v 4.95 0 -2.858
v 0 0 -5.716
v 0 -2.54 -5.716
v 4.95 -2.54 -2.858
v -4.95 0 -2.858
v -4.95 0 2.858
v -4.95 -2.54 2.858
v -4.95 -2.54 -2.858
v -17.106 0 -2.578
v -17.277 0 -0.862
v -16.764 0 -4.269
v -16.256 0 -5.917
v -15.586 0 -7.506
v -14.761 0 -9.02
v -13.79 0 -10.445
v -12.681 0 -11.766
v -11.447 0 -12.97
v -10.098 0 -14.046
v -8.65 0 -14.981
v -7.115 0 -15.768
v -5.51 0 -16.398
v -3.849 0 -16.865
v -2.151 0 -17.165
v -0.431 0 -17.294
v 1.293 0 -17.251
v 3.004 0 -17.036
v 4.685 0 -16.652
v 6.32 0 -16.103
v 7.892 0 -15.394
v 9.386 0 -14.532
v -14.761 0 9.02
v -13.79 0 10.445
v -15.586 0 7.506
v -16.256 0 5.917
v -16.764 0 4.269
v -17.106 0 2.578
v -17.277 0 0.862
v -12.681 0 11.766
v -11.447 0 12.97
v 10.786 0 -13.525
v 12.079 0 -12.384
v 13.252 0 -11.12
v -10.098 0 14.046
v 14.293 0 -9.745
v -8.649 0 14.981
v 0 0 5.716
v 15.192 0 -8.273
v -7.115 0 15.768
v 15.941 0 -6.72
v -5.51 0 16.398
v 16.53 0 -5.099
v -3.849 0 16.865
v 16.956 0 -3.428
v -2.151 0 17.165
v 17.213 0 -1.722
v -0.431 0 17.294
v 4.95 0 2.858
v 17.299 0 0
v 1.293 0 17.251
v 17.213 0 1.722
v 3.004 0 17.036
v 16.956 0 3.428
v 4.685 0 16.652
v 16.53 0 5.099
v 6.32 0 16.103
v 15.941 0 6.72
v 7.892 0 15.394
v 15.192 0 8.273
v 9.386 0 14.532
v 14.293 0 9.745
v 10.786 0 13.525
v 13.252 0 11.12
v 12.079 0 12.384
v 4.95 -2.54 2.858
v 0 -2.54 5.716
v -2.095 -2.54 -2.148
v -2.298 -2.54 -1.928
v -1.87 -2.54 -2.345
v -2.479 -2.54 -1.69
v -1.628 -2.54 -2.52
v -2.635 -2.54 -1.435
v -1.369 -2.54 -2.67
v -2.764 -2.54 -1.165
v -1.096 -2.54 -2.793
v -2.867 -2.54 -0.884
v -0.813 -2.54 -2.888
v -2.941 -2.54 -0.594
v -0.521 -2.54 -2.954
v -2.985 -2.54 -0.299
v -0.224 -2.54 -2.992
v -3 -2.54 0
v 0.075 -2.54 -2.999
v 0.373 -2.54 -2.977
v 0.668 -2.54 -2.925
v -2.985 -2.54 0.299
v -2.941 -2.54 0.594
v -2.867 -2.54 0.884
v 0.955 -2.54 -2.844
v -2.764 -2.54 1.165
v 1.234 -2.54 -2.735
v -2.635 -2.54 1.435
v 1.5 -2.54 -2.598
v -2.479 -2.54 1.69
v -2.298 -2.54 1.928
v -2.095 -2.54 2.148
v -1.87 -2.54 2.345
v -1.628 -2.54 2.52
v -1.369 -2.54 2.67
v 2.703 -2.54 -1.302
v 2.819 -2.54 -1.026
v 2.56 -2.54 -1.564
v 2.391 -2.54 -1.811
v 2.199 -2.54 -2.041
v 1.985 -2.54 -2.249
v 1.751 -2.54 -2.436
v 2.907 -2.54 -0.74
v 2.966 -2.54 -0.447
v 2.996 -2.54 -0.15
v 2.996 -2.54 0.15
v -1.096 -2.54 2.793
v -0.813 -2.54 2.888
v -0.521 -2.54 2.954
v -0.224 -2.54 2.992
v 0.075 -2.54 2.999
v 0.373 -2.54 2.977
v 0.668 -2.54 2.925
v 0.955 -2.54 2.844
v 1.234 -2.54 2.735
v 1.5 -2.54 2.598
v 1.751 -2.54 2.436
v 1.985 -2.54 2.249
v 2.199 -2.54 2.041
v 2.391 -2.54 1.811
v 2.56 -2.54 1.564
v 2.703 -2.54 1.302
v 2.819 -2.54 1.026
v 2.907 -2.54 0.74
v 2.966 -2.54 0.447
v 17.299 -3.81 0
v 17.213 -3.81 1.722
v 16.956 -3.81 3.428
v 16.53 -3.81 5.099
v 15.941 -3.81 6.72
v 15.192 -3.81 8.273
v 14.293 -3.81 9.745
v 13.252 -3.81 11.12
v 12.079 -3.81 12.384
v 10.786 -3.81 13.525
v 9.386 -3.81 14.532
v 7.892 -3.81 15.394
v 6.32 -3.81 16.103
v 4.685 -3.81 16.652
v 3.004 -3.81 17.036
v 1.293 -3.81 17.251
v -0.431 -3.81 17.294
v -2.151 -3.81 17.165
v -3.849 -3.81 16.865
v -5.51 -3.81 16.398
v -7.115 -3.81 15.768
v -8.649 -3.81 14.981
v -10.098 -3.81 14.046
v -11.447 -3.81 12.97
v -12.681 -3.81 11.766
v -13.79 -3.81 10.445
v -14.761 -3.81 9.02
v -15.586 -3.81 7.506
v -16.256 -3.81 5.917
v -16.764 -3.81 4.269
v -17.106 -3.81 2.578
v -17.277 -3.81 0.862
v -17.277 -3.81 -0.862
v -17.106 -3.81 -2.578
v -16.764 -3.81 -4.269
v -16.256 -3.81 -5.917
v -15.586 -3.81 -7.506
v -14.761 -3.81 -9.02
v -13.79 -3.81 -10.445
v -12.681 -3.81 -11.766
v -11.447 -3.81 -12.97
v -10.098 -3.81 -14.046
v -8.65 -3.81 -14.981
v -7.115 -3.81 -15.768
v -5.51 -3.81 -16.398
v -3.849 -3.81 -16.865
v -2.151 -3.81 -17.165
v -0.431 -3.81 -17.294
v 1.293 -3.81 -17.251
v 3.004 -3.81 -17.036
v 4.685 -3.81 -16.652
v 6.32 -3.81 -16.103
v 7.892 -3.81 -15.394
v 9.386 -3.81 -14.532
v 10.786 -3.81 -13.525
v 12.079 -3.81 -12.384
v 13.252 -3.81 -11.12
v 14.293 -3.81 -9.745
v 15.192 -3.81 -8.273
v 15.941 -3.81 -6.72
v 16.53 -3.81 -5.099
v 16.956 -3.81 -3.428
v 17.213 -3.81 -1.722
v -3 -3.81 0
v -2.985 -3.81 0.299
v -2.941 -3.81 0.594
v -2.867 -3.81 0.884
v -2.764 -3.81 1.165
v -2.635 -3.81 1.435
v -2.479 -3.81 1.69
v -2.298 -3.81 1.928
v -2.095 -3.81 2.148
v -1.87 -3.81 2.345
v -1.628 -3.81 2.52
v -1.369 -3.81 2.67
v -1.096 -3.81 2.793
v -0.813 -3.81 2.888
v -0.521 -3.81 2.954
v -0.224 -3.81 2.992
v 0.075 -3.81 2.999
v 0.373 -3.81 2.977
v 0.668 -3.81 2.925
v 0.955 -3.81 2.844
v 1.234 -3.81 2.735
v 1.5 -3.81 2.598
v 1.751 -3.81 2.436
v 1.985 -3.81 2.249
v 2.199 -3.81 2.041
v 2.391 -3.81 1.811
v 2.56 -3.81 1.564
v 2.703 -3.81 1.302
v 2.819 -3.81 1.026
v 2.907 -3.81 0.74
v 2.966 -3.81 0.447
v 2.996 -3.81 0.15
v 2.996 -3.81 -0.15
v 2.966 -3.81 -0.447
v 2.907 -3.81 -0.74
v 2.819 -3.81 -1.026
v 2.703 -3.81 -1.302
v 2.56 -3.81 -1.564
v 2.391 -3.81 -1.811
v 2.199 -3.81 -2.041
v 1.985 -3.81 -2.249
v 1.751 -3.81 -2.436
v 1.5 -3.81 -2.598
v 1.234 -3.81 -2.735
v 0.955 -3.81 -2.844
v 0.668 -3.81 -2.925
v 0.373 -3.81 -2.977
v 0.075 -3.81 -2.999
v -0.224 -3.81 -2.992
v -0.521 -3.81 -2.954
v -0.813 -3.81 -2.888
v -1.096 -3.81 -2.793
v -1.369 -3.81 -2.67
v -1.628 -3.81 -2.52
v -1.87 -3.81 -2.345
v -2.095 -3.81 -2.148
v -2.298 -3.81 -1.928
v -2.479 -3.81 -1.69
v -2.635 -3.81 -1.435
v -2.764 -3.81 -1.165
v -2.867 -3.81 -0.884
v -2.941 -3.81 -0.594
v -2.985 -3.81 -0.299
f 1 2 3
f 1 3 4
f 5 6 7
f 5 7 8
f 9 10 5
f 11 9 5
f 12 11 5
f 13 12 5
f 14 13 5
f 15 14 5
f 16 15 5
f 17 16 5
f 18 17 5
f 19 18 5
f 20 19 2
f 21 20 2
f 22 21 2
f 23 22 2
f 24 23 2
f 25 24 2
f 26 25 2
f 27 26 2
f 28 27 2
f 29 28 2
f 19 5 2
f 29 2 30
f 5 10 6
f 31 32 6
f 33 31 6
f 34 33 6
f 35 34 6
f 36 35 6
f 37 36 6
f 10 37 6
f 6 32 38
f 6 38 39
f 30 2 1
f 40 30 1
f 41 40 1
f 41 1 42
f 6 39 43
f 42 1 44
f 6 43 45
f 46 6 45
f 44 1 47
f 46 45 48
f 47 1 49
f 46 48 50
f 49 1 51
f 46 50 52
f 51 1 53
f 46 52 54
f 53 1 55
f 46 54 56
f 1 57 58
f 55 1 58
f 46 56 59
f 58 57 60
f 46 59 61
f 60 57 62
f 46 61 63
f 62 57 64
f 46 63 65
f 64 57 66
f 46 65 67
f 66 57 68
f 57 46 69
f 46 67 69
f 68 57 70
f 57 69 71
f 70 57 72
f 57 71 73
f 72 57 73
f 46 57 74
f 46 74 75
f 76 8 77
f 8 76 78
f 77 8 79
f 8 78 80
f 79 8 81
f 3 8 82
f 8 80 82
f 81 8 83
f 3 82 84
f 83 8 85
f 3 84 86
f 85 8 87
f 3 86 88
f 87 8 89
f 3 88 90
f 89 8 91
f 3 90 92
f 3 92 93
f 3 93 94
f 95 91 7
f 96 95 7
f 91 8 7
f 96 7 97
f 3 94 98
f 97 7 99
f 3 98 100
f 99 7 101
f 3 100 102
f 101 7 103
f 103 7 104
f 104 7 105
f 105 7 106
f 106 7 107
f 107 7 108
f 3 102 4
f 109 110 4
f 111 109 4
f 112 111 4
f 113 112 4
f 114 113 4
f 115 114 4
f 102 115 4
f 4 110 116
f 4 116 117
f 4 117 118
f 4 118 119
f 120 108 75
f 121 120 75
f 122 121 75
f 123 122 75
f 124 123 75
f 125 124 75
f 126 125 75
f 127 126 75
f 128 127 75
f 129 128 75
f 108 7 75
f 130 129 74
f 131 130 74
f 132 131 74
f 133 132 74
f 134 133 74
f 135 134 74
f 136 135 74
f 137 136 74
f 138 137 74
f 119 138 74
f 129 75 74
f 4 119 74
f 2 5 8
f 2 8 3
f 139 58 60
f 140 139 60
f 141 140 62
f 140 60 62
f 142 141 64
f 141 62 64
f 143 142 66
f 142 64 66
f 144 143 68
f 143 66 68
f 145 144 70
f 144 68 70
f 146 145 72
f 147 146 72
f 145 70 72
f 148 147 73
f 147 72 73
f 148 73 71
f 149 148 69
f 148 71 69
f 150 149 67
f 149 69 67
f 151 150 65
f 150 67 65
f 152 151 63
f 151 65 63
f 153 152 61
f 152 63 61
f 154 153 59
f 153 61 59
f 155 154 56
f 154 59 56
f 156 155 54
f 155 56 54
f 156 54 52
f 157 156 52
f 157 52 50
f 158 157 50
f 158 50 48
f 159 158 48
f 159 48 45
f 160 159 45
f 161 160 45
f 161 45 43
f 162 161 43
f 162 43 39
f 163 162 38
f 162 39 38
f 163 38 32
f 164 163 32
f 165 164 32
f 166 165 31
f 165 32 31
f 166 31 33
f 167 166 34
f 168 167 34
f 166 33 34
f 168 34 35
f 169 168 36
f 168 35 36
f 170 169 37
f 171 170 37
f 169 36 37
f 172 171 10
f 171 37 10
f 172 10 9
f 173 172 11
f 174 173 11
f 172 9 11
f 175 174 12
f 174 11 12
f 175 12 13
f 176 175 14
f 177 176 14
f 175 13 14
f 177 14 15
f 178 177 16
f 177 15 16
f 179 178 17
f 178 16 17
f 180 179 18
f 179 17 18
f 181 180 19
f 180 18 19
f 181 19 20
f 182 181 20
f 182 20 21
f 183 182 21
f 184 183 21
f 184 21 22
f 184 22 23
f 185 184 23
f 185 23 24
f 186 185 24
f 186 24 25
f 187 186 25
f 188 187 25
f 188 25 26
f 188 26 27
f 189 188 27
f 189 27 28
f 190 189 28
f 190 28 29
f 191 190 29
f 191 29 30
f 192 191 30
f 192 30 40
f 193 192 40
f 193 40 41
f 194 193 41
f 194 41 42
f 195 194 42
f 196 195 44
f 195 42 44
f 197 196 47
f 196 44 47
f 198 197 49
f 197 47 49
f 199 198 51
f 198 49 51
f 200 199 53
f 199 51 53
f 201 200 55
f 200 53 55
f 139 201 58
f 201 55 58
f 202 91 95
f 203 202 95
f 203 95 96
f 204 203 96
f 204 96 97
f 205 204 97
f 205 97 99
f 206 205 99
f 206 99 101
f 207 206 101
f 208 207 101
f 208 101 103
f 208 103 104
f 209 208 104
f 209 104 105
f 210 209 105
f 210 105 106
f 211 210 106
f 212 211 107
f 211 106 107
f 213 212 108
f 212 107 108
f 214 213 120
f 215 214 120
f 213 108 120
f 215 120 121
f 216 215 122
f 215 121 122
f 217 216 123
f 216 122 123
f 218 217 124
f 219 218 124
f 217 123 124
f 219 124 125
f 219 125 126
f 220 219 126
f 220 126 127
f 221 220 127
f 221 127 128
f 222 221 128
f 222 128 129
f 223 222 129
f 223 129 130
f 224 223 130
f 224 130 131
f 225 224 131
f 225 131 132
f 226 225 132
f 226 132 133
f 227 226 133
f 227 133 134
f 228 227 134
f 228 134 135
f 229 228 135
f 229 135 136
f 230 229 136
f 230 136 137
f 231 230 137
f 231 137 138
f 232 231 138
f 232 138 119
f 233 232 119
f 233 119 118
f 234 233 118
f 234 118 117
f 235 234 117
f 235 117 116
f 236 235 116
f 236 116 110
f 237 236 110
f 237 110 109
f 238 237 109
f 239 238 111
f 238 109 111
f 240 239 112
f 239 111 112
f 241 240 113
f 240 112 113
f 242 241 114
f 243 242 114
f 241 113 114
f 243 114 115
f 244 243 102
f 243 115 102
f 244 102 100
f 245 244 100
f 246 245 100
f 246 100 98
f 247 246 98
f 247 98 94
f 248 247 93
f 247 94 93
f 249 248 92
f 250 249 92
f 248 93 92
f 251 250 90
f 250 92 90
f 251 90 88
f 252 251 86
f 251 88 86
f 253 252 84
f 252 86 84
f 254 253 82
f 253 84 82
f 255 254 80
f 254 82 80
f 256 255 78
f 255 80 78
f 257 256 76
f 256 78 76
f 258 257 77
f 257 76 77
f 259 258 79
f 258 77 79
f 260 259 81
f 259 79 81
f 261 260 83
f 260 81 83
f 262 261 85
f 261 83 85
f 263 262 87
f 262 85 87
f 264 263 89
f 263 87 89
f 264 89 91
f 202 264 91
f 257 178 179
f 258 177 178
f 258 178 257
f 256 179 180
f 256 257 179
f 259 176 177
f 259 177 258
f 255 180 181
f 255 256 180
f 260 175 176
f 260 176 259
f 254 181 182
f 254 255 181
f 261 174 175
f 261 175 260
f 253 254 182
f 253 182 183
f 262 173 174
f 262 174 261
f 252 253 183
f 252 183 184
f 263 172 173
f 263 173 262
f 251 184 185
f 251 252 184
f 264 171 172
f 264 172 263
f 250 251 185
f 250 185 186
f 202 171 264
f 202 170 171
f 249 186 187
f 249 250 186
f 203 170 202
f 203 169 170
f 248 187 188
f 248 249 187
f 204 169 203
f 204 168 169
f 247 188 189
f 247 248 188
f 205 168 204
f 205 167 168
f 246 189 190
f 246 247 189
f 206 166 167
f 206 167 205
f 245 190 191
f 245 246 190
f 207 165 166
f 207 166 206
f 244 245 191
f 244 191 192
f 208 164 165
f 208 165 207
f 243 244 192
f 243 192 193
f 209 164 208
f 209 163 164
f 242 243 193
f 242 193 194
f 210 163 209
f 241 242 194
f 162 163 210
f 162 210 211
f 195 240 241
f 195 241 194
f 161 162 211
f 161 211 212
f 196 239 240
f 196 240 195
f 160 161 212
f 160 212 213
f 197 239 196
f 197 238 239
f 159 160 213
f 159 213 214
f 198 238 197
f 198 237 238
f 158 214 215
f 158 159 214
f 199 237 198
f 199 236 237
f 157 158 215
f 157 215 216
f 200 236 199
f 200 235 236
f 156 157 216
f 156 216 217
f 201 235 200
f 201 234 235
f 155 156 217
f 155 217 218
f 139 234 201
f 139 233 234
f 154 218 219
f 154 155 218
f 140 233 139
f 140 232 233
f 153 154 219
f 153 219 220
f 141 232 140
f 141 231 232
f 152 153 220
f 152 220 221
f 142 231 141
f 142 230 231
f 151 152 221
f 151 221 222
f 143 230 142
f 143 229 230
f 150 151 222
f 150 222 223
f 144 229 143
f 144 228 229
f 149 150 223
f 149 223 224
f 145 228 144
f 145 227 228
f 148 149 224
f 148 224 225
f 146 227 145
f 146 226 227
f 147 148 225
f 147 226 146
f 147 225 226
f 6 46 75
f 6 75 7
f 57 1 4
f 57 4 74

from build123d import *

# Parameters (mm, degrees)
F0_R     = 17.299
F1_DEPTH = 3.81
F3_DEPTH = 1.27
F4_DEPTH = 2.54
F5_R     = 3
F6_DEPTH = 3.811


with BuildPart() as f1:
    # F0 (on Front) → F1 (new body)
    with BuildSketch(Plane.XZ):
        Circle(F0_R)
    extrude(amount=F1_DEPTH)

    # F2 (on Front) → F3 (cut)
    with BuildSketch(Plane.XZ):
        Polygon((-4.95, 2.857884), (-4.95, -2.857884), (0, -5.715768), (4.95, -2.857884), (4.95, 2.857884), (0, 5.715768), align=None)
    extrude(amount=F3_DEPTH, mode=Mode.SUBTRACT)

    # F2 (on Front) → F4 (cut)
    with BuildSketch(Plane.XZ):
        Polygon((-4.95, 2.857884), (-4.95, -2.857884), (0, -5.715768), (4.95, -2.857884), (4.95, 2.857884), (0, 5.715768), align=None)
    extrude(amount=F4_DEPTH, mode=Mode.SUBTRACT)

    # F5 (on face) → F6 (cut, through all)
    with BuildSketch(Plane(origin=(0, 0, 0), x_dir=(-1, 0, 0), z_dir=(0, 1, 0))):
        Circle(F5_R)
    extrude(amount=-F6_DEPTH, mode=Mode.SUBTRACT)


solid = f1.part
